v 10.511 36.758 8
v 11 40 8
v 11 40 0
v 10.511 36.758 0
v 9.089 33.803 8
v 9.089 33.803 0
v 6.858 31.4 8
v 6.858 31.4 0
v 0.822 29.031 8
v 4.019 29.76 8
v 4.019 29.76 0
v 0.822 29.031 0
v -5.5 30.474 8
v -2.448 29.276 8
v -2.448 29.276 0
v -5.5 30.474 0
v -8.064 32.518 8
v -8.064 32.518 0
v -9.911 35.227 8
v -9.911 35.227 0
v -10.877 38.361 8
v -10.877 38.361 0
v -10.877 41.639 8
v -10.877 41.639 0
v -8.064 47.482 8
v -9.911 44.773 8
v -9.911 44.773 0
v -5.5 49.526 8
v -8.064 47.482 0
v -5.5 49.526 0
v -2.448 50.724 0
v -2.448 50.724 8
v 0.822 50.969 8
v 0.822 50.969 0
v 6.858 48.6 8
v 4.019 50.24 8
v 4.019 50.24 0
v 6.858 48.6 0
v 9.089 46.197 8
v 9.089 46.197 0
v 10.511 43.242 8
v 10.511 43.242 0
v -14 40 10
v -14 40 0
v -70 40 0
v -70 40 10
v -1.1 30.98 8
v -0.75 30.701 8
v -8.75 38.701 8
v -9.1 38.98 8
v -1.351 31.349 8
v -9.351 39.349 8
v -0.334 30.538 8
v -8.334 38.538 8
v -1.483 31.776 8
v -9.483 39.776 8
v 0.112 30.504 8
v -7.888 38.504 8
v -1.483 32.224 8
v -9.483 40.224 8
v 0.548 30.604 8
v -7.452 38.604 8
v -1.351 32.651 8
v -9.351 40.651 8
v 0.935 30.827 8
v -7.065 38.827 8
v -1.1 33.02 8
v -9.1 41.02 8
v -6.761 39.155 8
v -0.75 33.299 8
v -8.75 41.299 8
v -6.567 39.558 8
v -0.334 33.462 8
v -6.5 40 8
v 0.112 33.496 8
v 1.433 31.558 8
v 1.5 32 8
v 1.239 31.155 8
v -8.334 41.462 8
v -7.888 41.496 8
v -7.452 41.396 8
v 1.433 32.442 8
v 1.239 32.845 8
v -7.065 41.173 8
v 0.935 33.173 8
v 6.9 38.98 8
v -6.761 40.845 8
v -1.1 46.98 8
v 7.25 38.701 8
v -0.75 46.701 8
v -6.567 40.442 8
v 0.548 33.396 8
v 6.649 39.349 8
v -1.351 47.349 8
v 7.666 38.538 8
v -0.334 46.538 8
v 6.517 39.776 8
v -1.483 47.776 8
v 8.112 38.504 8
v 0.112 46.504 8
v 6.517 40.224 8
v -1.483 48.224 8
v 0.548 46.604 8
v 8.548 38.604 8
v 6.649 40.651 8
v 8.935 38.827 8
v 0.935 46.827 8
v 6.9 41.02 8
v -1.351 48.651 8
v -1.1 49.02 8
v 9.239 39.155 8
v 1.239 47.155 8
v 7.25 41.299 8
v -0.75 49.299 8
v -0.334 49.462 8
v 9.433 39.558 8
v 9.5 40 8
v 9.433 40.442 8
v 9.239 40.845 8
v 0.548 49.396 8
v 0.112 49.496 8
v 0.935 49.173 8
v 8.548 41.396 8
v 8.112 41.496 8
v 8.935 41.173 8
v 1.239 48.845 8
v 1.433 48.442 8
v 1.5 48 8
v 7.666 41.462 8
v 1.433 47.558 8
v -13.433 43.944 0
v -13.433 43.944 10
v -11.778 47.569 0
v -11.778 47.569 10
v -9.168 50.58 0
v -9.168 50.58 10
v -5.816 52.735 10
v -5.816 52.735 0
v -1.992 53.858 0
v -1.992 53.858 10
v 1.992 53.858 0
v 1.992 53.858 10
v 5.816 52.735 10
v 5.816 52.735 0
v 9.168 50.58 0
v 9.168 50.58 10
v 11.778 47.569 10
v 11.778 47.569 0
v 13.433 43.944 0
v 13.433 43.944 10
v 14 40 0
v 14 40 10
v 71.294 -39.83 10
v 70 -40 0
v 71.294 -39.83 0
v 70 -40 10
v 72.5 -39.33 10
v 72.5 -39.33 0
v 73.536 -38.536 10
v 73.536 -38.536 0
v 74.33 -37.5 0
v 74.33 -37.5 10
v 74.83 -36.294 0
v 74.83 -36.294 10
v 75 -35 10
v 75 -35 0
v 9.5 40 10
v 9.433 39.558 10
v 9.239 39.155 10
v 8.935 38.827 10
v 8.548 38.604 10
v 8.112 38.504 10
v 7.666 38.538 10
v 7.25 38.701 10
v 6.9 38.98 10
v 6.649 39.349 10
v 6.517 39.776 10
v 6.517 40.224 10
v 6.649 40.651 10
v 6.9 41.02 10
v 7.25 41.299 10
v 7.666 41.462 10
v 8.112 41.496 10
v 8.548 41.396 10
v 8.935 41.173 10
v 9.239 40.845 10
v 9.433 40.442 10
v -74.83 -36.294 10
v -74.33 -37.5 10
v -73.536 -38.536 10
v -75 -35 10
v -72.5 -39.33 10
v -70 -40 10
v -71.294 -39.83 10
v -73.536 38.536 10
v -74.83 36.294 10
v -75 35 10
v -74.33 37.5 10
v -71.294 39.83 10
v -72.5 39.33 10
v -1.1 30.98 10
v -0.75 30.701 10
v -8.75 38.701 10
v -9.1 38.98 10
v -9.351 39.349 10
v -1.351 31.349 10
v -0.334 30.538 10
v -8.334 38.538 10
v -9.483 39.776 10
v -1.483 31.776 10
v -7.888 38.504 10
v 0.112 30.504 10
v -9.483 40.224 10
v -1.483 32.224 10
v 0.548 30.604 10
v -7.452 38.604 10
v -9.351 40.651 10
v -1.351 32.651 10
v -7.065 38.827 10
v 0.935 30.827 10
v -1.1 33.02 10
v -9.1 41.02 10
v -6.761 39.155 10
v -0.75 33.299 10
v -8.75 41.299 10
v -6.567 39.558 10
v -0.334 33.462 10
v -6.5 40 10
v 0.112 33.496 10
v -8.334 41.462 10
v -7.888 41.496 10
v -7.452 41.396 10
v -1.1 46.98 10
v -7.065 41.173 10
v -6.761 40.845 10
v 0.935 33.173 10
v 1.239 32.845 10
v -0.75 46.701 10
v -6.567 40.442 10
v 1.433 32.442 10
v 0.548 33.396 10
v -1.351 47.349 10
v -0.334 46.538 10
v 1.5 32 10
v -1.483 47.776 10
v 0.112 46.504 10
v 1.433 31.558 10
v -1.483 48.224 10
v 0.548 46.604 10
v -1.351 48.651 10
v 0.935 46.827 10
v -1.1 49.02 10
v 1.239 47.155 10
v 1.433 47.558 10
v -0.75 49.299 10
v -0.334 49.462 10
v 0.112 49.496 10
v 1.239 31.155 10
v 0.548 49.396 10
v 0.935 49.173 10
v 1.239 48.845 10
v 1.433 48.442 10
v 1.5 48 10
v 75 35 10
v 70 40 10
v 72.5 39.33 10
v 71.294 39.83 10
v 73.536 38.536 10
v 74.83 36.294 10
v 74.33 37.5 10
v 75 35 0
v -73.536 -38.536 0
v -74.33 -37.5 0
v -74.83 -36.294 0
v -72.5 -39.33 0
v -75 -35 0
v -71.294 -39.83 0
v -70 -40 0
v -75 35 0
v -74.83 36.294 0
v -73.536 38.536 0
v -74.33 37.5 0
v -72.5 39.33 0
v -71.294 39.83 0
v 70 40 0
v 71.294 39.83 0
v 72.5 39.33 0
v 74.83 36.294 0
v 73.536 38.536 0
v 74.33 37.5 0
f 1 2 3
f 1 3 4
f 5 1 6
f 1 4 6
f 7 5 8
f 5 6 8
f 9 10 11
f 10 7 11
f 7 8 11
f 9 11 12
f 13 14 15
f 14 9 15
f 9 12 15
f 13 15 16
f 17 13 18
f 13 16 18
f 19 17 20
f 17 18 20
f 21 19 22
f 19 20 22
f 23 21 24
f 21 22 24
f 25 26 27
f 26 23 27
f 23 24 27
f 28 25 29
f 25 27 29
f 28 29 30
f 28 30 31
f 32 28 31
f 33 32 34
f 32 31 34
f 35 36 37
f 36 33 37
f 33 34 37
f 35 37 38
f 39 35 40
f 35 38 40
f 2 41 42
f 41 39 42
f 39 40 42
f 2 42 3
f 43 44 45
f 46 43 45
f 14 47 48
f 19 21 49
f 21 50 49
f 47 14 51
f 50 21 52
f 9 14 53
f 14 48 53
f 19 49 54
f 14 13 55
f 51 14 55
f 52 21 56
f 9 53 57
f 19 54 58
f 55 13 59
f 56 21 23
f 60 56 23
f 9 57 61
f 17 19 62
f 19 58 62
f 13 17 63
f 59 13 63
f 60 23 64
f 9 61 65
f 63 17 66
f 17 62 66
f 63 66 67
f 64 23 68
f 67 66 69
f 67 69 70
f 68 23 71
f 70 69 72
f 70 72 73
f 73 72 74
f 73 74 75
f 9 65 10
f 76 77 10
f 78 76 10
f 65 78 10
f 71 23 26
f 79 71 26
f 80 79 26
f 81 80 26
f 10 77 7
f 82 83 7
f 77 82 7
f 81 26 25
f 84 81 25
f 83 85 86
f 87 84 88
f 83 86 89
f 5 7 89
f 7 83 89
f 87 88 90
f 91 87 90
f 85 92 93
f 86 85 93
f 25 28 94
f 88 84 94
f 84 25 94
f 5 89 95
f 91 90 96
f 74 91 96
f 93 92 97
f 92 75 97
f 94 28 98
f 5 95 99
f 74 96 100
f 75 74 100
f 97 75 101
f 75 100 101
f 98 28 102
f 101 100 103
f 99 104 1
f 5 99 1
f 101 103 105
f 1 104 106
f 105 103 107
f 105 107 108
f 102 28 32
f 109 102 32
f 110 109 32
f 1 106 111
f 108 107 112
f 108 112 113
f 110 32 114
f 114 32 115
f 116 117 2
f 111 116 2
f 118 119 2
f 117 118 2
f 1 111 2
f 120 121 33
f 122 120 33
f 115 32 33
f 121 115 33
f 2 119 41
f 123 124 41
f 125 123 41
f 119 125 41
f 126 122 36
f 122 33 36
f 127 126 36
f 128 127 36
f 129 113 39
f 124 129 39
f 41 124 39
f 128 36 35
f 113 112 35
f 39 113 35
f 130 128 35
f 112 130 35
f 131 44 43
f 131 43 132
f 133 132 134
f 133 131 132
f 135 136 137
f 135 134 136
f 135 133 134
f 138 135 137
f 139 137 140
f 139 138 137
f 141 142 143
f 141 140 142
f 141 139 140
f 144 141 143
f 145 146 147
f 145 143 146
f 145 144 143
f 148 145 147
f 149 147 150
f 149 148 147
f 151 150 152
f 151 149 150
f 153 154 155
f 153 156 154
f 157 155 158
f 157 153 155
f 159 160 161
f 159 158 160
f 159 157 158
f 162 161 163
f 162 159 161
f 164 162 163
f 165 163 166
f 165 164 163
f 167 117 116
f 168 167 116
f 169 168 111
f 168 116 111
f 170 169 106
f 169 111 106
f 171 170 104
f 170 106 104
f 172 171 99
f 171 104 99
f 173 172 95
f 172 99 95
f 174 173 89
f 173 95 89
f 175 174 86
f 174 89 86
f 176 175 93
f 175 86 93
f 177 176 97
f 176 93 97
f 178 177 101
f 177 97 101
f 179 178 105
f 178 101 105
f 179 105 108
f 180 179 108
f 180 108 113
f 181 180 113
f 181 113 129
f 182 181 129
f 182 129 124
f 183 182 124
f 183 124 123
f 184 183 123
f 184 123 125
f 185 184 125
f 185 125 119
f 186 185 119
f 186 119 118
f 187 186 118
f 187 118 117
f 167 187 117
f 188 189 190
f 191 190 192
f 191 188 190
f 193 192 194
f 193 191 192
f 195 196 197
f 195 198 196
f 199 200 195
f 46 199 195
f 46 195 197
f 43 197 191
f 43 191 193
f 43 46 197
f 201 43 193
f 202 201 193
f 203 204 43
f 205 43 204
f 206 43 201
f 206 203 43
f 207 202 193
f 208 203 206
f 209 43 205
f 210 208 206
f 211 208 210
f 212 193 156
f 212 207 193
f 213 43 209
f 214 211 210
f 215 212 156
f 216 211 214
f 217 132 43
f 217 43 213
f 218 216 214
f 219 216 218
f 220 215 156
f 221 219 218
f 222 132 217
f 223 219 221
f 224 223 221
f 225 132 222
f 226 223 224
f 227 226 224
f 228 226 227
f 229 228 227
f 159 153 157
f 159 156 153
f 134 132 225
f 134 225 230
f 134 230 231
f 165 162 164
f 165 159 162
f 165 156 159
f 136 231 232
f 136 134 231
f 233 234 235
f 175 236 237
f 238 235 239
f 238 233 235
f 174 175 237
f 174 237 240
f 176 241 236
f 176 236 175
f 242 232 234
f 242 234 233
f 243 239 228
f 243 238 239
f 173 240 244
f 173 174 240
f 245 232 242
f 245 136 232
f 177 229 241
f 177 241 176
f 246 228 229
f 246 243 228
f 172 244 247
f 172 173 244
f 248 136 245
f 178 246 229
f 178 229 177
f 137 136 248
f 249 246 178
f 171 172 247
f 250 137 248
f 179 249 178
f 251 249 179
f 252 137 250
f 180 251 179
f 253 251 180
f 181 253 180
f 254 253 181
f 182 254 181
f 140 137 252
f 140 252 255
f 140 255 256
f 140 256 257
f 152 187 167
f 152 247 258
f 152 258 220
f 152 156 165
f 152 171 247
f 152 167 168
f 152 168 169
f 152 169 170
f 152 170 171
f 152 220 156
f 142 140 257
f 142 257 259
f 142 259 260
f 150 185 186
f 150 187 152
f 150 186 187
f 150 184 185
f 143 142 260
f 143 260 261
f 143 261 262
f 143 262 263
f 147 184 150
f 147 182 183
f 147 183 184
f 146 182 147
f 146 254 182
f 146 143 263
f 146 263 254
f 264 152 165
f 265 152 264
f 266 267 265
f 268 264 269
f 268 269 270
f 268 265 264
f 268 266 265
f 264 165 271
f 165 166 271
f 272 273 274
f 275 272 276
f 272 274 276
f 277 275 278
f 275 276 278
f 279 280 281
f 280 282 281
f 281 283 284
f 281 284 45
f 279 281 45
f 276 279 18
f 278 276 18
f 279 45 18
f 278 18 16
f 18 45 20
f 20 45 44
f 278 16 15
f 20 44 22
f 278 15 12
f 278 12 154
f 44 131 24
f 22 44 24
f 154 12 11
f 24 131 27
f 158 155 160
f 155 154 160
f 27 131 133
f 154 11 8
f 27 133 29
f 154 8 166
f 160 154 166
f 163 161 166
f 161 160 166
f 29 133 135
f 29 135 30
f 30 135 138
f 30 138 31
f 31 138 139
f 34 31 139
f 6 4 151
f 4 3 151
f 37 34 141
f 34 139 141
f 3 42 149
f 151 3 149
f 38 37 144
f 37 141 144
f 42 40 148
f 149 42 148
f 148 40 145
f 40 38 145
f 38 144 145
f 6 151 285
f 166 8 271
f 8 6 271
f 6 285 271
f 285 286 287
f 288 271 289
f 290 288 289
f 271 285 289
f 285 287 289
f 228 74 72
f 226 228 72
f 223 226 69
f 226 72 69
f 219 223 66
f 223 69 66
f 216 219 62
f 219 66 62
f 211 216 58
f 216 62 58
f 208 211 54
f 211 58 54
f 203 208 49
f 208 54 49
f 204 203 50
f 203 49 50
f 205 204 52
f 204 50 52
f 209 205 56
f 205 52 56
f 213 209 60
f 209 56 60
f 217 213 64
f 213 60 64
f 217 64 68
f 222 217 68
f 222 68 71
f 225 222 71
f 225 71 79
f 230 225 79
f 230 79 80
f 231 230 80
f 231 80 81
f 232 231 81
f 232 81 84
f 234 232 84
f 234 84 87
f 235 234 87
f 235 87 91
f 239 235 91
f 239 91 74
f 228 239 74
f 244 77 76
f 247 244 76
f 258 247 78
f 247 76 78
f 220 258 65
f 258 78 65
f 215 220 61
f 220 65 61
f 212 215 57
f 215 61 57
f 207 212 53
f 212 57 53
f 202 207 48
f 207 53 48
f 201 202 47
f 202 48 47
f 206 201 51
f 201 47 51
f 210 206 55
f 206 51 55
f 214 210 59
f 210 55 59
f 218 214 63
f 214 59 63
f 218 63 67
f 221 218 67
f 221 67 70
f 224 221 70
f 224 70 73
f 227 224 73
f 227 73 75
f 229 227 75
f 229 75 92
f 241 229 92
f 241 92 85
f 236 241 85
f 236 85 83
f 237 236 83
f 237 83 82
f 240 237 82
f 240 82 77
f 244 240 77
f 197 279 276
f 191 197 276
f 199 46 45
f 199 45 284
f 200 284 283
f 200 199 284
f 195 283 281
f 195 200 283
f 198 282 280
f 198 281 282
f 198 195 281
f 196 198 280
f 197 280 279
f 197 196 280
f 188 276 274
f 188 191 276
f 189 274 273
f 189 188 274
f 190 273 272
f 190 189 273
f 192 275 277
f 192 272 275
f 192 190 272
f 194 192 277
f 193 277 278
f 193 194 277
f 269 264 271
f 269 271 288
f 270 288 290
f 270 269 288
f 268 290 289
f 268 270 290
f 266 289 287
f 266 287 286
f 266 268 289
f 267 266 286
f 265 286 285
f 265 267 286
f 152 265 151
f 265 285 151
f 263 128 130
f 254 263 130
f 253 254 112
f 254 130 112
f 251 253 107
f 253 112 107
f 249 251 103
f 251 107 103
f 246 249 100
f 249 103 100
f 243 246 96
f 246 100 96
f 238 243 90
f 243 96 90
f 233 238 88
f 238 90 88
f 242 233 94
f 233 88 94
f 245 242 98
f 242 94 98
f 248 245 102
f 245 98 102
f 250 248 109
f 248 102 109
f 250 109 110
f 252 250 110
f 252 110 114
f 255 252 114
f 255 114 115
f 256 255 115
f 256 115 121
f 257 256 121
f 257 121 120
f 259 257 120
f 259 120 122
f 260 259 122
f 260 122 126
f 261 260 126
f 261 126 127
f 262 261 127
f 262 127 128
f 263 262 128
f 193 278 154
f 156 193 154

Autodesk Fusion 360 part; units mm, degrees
sketch "Sketch1" plane through (0, 0, 0) normal (0, 0, 1) x (1, 0, 0)
  line L0 (75, 40) -> (-75, 40)
  line L1 (-75, 40) -> (-75, -40)
  line L2 (-75, -40) -> (75, -40)
  line L3 (75, -40) -> (75, 40)
  line L4 (75, 40) -> (-75, -40) construction
  line L5 (-75, 40) -> (75, -40) construction
  dimension "d1" = 150
  dimension "d2" = 80
extrude "Extrude1" add sketch "Sketch1" along normal blind 10
sketch "Sketch2" plane through (0, 0, 0) normal (0, 0, 1) x (1, 0, 0)
  circle A0 centre (0, 40) radius 14
  dimension "d10" = 28
extrude "Extrude2" add sketch "Sketch2" along normal blind 10
sketch "Sketch3" plane through (0, 0, 0) normal (0, 0, 1) x (1, 0, 0)
  circle A0 centre (0, 40) radius 11
  dimension "d7" = 22
extrude "Extrude3" cut sketch "Sketch3" along normal blind 8
fillet "Fillet1" radius 5 4 edges at (75, -40, 5) (75, 40, 5) (-75, -40, 5) (-75, 40, 5)
sketch "Sketch4" plane through (0, 0, 8) normal (0, 0, -1) x (1, 0, 0)
  circle A0 centre (0, -32) radius 1.5
  circle A1 centre (0, -48) radius 1.5
  circle A2 centre (-8, -40) radius 1.5
  circle A3 centre (8, -40) radius 1.5
  circle A4 centre (0, -40) radius 11
  dimension "d13" = 3
  dimension "d14" = 3
  dimension "d15" = 3
  dimension "d16" = 3
extrude "Extrude4" cut sketch "Sketch4" against normal blind 2 contours A0 | A1 | A2 | A3
